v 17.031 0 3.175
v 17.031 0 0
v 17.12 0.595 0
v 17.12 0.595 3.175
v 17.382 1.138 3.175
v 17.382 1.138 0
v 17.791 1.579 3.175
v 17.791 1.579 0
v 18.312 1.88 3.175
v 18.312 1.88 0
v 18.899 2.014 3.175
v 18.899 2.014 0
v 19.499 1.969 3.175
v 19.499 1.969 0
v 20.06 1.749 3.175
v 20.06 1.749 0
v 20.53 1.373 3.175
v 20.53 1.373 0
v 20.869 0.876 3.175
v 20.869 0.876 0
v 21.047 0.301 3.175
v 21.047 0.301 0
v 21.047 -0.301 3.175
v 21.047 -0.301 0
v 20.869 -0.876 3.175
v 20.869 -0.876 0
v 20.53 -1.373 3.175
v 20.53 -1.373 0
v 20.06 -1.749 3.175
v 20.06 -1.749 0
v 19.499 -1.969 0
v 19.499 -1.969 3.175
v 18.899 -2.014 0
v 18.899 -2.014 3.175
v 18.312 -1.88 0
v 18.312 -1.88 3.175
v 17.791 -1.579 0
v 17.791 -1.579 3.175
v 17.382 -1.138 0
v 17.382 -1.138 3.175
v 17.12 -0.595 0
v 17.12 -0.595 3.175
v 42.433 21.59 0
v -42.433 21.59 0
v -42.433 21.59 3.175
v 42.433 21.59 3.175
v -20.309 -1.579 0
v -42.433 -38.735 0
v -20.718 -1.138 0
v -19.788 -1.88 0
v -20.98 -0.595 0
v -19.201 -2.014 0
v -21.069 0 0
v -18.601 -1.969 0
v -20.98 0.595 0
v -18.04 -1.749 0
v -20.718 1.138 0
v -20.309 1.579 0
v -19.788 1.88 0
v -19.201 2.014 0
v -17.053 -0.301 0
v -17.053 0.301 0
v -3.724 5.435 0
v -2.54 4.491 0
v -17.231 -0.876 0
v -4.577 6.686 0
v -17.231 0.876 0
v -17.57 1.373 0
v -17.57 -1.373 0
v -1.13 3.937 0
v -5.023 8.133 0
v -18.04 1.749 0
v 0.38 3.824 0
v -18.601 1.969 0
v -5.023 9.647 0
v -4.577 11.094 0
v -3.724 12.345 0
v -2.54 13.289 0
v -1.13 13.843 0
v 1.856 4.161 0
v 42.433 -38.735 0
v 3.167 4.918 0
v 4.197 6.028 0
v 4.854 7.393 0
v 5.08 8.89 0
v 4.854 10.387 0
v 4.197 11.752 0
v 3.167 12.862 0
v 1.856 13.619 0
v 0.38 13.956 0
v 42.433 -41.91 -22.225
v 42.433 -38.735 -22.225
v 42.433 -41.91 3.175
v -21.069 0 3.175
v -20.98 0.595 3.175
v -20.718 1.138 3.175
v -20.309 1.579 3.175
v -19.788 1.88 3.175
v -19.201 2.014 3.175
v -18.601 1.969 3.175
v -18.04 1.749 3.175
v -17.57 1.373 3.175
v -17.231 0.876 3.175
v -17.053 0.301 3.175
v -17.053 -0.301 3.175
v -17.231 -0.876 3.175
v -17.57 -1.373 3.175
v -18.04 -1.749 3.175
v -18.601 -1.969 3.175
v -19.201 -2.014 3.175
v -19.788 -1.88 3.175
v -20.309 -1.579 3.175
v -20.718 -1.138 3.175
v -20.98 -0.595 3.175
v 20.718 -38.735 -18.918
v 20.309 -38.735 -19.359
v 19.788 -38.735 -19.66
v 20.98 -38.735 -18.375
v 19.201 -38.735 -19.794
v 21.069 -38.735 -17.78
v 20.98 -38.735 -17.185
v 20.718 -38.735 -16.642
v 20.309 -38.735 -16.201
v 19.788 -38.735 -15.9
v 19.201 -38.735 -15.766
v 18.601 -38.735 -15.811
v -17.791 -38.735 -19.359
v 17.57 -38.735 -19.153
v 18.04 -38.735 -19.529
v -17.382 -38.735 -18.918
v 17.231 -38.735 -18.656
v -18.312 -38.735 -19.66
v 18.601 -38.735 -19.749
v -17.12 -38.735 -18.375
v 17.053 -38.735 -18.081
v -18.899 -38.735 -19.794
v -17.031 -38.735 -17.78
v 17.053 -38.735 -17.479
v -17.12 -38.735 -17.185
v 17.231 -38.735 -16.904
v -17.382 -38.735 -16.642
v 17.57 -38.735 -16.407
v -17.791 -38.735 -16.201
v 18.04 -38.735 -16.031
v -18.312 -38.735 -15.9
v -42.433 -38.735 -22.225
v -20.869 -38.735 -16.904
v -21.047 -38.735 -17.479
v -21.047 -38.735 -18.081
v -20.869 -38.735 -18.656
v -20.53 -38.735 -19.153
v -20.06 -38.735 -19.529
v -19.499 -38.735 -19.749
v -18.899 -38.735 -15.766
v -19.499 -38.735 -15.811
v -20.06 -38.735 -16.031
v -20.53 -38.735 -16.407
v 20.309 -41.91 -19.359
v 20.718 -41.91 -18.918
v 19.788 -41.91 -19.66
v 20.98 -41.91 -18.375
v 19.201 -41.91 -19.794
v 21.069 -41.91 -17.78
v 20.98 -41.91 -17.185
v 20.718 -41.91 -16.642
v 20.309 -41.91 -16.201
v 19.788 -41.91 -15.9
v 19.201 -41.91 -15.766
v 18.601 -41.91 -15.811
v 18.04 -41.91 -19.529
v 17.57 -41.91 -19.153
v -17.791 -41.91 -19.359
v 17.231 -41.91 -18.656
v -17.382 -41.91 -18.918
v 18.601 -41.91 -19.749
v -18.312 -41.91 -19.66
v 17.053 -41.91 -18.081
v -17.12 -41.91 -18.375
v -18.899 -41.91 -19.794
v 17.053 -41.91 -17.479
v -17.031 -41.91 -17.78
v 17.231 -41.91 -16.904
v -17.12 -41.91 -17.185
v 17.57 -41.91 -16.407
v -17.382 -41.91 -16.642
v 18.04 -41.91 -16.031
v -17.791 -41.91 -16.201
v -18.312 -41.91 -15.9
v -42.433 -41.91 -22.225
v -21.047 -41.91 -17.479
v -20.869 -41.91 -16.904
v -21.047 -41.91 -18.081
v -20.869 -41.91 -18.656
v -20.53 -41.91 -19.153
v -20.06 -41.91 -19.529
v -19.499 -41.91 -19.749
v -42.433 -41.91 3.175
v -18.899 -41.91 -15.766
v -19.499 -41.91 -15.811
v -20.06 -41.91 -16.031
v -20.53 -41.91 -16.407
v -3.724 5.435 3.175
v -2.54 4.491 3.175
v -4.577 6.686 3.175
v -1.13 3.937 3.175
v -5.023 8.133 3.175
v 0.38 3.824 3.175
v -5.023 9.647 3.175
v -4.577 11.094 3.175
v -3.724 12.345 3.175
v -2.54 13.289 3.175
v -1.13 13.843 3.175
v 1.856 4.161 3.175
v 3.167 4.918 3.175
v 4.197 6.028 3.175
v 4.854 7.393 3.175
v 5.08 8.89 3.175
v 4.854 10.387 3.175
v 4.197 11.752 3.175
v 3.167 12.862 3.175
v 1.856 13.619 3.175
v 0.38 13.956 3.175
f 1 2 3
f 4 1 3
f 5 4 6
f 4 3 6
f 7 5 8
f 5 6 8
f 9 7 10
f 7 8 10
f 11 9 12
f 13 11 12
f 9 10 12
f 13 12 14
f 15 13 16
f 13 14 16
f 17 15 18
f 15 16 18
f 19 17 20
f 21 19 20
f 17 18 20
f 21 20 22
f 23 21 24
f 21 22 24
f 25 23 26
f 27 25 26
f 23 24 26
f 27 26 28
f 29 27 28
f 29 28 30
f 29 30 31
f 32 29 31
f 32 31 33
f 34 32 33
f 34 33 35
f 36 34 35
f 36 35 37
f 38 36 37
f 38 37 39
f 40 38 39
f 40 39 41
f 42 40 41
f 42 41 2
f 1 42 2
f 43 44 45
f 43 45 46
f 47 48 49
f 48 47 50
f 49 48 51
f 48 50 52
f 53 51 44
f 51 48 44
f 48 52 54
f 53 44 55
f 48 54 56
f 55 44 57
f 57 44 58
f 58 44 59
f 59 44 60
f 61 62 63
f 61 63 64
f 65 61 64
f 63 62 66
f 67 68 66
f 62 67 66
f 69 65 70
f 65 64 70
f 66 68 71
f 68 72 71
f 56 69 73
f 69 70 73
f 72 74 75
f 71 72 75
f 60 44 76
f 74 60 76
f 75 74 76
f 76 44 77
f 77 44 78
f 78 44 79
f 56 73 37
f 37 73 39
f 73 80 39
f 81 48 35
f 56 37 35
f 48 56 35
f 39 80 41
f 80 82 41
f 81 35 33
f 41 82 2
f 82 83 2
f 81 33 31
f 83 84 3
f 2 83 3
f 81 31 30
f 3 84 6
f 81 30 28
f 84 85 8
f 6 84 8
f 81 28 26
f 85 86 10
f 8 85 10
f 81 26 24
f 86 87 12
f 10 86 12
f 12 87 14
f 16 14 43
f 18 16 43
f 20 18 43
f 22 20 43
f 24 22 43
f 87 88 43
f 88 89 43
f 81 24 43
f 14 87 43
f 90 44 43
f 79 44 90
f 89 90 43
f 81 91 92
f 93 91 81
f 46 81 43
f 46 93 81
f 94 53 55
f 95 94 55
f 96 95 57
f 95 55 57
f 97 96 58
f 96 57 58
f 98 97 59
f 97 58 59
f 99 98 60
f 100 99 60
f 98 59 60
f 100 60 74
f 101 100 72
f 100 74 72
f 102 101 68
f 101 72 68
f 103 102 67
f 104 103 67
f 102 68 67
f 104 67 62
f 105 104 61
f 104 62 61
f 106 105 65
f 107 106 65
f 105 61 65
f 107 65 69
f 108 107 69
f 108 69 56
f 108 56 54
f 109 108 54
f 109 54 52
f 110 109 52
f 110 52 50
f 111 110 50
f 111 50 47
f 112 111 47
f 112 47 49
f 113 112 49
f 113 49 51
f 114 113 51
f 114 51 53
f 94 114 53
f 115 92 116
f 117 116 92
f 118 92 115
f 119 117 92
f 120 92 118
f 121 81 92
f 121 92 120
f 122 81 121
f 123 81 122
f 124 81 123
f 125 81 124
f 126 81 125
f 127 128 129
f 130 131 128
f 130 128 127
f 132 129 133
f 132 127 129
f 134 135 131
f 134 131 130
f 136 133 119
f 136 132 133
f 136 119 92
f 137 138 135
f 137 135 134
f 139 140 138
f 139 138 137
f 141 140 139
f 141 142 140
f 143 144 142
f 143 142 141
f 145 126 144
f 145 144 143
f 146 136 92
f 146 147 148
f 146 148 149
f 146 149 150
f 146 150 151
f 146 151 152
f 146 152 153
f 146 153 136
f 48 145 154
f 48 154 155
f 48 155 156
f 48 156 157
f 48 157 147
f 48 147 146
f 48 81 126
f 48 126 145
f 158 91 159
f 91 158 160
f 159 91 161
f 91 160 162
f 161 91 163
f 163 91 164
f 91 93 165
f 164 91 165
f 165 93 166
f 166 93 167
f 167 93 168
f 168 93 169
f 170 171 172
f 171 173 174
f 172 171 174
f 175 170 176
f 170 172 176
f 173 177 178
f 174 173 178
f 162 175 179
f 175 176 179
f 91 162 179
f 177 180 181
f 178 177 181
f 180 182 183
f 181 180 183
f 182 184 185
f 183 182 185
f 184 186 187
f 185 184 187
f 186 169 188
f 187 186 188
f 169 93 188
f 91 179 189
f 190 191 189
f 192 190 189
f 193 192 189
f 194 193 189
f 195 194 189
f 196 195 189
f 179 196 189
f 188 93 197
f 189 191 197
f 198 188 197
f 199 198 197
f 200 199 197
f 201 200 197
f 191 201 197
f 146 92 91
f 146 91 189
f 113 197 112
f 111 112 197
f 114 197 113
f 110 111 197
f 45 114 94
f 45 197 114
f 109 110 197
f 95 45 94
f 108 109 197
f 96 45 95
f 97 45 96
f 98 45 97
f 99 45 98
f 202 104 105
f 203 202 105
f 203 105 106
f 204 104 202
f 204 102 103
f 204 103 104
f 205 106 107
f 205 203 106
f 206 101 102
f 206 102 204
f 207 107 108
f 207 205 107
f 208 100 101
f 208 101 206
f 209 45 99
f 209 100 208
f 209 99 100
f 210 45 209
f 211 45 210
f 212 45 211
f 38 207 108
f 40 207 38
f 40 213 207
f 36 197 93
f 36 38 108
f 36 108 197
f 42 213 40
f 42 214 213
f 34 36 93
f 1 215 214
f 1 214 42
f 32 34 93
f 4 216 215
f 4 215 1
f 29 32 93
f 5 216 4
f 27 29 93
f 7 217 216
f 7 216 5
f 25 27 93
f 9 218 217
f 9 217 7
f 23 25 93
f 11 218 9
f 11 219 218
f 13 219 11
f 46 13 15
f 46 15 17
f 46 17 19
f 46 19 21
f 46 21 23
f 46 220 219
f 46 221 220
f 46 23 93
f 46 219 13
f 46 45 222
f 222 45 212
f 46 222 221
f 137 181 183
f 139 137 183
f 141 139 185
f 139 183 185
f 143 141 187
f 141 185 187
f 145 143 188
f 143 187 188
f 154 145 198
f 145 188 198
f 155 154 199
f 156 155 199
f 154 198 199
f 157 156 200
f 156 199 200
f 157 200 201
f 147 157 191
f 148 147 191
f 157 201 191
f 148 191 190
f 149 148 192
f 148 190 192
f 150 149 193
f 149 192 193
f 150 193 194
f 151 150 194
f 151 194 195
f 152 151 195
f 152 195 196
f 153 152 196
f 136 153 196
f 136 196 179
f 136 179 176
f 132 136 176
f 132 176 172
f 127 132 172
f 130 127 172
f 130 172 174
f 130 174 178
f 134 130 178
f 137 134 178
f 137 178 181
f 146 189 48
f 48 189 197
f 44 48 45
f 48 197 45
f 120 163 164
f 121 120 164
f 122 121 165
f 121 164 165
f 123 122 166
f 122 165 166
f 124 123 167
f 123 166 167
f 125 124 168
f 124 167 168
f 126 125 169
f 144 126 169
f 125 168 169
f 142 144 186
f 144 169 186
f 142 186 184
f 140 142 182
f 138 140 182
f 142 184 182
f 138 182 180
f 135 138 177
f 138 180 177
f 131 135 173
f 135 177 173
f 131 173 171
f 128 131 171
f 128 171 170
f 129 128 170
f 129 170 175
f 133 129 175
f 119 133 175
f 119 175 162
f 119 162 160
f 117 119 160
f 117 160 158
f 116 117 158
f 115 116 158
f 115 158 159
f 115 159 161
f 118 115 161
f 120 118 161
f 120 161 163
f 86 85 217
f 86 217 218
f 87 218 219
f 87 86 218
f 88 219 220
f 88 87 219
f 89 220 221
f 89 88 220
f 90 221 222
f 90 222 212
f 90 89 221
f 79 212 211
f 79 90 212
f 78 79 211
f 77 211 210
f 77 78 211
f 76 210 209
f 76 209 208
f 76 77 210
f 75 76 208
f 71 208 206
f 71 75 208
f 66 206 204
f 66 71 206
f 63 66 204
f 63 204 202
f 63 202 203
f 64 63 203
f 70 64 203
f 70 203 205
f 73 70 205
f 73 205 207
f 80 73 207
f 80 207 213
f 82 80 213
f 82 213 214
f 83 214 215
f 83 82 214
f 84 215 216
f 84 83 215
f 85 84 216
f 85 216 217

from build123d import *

# Parameters (mm, degrees)
SKETCH1_W                  = 84.86693599
SKETCH1_H                  = 63.5
SKETCH1_R                  = 5.08
BOSS_EXTRUDE1_DEPTH        = 3.175
F_10_32_TAPPED_HOLE1_D     = 4.0386
F_10_32_TAPPED_HOLE1_DEPTH = 11.938
F_10_32_TAPPED_HOLE1_TIP   = 1.213317848
F_10_32_TAPPED_HOLE2_D     = 4.0386
F_10_32_TAPPED_HOLE2_DEPTH = 11.938
F_10_32_TAPPED_HOLE2_TIP   = 1.213317848
SKETCH10_W                 = 84.86693599
SKETCH10_H                 = 3.175
BOSS_EXTRUDE2_DEPTH        = 22.225
F_10_32_TAPPED_HOLE3_D     = 4.0386
F_10_32_TAPPED_HOLE3_DEPTH = 11.938
F_10_32_TAPPED_HOLE3_TIP   = 1.213317848
F_10_32_TAPPED_HOLE4_D     = 4.0386
F_10_32_TAPPED_HOLE4_DEPTH = 11.938
F_10_32_TAPPED_HOLE4_TIP   = 1.213317848


with BuildPart() as part:
    # Sketch1 → Boss-Extrude1 (new body)
    with BuildSketch(Plane.XY):
        with Locations((0, -10.16)):
            Rectangle(SKETCH1_W, SKETCH1_H)
        with Locations((0, 8.89)):
            Circle(SKETCH1_R, mode=Mode.SUBTRACT)
    extrude(amount=BOSS_EXTRUDE1_DEPTH)

    # #10-32 Tapped Hole1
    with Locations(Plane.XY.offset(3.175)):
        with Locations((-19.05, 0)):
            Hole(F_10_32_TAPPED_HOLE1_D / 2, depth=F_10_32_TAPPED_HOLE1_DEPTH)
            with Locations((0, 0, -(F_10_32_TAPPED_HOLE1_DEPTH + F_10_32_TAPPED_HOLE1_TIP / 2))):  # 118° drill point
                Cone(0, F_10_32_TAPPED_HOLE1_D / 2, F_10_32_TAPPED_HOLE1_TIP, mode=Mode.SUBTRACT)

    # #10-32 Tapped Hole2
    with Locations(Plane.XY.offset(3.175)):
        with Locations((19.05, 0)):
            Hole(F_10_32_TAPPED_HOLE2_D / 2, depth=F_10_32_TAPPED_HOLE2_DEPTH)
            with Locations((0, 0, -(F_10_32_TAPPED_HOLE2_DEPTH + F_10_32_TAPPED_HOLE2_TIP / 2))):  # 118° drill point
                Cone(0, F_10_32_TAPPED_HOLE2_D / 2, F_10_32_TAPPED_HOLE2_TIP, mode=Mode.SUBTRACT)

    # Sketch10 → Boss-Extrude2 (add)
    with BuildSketch(Plane(origin=(0, 0, 0), x_dir=(-1, 0, 0), z_dir=(0, 0, -1))):
        with Locations((0, -40.3225)):
            Rectangle(SKETCH10_W, SKETCH10_H)
    extrude(amount=BOSS_EXTRUDE2_DEPTH)

    # #10-32 Tapped Hole3
    with Locations(Plane(origin=(0, -38.735, 0), x_dir=(-1, 0, 0), z_dir=(0, 1, 0))):
        with Locations((19.05, -17.78)):
            Hole(F_10_32_TAPPED_HOLE3_D / 2, depth=F_10_32_TAPPED_HOLE3_DEPTH)
            with Locations((0, 0, -(F_10_32_TAPPED_HOLE3_DEPTH + F_10_32_TAPPED_HOLE3_TIP / 2))):  # 118° drill point
                Cone(0, F_10_32_TAPPED_HOLE3_D / 2, F_10_32_TAPPED_HOLE3_TIP, mode=Mode.SUBTRACT)

    # #10-32 Tapped Hole4
    with Locations(Plane(origin=(0, -38.735, 0), x_dir=(-1, 0, 0), z_dir=(0, 1, 0))):
        with Locations((-19.05, -17.78)):
            Hole(F_10_32_TAPPED_HOLE4_D / 2, depth=F_10_32_TAPPED_HOLE4_DEPTH)
            with Locations((0, 0, -(F_10_32_TAPPED_HOLE4_DEPTH + F_10_32_TAPPED_HOLE4_TIP / 2))):  # 118° drill point
                Cone(0, F_10_32_TAPPED_HOLE4_D / 2, F_10_32_TAPPED_HOLE4_TIP, mode=Mode.SUBTRACT)


solid = part.part
